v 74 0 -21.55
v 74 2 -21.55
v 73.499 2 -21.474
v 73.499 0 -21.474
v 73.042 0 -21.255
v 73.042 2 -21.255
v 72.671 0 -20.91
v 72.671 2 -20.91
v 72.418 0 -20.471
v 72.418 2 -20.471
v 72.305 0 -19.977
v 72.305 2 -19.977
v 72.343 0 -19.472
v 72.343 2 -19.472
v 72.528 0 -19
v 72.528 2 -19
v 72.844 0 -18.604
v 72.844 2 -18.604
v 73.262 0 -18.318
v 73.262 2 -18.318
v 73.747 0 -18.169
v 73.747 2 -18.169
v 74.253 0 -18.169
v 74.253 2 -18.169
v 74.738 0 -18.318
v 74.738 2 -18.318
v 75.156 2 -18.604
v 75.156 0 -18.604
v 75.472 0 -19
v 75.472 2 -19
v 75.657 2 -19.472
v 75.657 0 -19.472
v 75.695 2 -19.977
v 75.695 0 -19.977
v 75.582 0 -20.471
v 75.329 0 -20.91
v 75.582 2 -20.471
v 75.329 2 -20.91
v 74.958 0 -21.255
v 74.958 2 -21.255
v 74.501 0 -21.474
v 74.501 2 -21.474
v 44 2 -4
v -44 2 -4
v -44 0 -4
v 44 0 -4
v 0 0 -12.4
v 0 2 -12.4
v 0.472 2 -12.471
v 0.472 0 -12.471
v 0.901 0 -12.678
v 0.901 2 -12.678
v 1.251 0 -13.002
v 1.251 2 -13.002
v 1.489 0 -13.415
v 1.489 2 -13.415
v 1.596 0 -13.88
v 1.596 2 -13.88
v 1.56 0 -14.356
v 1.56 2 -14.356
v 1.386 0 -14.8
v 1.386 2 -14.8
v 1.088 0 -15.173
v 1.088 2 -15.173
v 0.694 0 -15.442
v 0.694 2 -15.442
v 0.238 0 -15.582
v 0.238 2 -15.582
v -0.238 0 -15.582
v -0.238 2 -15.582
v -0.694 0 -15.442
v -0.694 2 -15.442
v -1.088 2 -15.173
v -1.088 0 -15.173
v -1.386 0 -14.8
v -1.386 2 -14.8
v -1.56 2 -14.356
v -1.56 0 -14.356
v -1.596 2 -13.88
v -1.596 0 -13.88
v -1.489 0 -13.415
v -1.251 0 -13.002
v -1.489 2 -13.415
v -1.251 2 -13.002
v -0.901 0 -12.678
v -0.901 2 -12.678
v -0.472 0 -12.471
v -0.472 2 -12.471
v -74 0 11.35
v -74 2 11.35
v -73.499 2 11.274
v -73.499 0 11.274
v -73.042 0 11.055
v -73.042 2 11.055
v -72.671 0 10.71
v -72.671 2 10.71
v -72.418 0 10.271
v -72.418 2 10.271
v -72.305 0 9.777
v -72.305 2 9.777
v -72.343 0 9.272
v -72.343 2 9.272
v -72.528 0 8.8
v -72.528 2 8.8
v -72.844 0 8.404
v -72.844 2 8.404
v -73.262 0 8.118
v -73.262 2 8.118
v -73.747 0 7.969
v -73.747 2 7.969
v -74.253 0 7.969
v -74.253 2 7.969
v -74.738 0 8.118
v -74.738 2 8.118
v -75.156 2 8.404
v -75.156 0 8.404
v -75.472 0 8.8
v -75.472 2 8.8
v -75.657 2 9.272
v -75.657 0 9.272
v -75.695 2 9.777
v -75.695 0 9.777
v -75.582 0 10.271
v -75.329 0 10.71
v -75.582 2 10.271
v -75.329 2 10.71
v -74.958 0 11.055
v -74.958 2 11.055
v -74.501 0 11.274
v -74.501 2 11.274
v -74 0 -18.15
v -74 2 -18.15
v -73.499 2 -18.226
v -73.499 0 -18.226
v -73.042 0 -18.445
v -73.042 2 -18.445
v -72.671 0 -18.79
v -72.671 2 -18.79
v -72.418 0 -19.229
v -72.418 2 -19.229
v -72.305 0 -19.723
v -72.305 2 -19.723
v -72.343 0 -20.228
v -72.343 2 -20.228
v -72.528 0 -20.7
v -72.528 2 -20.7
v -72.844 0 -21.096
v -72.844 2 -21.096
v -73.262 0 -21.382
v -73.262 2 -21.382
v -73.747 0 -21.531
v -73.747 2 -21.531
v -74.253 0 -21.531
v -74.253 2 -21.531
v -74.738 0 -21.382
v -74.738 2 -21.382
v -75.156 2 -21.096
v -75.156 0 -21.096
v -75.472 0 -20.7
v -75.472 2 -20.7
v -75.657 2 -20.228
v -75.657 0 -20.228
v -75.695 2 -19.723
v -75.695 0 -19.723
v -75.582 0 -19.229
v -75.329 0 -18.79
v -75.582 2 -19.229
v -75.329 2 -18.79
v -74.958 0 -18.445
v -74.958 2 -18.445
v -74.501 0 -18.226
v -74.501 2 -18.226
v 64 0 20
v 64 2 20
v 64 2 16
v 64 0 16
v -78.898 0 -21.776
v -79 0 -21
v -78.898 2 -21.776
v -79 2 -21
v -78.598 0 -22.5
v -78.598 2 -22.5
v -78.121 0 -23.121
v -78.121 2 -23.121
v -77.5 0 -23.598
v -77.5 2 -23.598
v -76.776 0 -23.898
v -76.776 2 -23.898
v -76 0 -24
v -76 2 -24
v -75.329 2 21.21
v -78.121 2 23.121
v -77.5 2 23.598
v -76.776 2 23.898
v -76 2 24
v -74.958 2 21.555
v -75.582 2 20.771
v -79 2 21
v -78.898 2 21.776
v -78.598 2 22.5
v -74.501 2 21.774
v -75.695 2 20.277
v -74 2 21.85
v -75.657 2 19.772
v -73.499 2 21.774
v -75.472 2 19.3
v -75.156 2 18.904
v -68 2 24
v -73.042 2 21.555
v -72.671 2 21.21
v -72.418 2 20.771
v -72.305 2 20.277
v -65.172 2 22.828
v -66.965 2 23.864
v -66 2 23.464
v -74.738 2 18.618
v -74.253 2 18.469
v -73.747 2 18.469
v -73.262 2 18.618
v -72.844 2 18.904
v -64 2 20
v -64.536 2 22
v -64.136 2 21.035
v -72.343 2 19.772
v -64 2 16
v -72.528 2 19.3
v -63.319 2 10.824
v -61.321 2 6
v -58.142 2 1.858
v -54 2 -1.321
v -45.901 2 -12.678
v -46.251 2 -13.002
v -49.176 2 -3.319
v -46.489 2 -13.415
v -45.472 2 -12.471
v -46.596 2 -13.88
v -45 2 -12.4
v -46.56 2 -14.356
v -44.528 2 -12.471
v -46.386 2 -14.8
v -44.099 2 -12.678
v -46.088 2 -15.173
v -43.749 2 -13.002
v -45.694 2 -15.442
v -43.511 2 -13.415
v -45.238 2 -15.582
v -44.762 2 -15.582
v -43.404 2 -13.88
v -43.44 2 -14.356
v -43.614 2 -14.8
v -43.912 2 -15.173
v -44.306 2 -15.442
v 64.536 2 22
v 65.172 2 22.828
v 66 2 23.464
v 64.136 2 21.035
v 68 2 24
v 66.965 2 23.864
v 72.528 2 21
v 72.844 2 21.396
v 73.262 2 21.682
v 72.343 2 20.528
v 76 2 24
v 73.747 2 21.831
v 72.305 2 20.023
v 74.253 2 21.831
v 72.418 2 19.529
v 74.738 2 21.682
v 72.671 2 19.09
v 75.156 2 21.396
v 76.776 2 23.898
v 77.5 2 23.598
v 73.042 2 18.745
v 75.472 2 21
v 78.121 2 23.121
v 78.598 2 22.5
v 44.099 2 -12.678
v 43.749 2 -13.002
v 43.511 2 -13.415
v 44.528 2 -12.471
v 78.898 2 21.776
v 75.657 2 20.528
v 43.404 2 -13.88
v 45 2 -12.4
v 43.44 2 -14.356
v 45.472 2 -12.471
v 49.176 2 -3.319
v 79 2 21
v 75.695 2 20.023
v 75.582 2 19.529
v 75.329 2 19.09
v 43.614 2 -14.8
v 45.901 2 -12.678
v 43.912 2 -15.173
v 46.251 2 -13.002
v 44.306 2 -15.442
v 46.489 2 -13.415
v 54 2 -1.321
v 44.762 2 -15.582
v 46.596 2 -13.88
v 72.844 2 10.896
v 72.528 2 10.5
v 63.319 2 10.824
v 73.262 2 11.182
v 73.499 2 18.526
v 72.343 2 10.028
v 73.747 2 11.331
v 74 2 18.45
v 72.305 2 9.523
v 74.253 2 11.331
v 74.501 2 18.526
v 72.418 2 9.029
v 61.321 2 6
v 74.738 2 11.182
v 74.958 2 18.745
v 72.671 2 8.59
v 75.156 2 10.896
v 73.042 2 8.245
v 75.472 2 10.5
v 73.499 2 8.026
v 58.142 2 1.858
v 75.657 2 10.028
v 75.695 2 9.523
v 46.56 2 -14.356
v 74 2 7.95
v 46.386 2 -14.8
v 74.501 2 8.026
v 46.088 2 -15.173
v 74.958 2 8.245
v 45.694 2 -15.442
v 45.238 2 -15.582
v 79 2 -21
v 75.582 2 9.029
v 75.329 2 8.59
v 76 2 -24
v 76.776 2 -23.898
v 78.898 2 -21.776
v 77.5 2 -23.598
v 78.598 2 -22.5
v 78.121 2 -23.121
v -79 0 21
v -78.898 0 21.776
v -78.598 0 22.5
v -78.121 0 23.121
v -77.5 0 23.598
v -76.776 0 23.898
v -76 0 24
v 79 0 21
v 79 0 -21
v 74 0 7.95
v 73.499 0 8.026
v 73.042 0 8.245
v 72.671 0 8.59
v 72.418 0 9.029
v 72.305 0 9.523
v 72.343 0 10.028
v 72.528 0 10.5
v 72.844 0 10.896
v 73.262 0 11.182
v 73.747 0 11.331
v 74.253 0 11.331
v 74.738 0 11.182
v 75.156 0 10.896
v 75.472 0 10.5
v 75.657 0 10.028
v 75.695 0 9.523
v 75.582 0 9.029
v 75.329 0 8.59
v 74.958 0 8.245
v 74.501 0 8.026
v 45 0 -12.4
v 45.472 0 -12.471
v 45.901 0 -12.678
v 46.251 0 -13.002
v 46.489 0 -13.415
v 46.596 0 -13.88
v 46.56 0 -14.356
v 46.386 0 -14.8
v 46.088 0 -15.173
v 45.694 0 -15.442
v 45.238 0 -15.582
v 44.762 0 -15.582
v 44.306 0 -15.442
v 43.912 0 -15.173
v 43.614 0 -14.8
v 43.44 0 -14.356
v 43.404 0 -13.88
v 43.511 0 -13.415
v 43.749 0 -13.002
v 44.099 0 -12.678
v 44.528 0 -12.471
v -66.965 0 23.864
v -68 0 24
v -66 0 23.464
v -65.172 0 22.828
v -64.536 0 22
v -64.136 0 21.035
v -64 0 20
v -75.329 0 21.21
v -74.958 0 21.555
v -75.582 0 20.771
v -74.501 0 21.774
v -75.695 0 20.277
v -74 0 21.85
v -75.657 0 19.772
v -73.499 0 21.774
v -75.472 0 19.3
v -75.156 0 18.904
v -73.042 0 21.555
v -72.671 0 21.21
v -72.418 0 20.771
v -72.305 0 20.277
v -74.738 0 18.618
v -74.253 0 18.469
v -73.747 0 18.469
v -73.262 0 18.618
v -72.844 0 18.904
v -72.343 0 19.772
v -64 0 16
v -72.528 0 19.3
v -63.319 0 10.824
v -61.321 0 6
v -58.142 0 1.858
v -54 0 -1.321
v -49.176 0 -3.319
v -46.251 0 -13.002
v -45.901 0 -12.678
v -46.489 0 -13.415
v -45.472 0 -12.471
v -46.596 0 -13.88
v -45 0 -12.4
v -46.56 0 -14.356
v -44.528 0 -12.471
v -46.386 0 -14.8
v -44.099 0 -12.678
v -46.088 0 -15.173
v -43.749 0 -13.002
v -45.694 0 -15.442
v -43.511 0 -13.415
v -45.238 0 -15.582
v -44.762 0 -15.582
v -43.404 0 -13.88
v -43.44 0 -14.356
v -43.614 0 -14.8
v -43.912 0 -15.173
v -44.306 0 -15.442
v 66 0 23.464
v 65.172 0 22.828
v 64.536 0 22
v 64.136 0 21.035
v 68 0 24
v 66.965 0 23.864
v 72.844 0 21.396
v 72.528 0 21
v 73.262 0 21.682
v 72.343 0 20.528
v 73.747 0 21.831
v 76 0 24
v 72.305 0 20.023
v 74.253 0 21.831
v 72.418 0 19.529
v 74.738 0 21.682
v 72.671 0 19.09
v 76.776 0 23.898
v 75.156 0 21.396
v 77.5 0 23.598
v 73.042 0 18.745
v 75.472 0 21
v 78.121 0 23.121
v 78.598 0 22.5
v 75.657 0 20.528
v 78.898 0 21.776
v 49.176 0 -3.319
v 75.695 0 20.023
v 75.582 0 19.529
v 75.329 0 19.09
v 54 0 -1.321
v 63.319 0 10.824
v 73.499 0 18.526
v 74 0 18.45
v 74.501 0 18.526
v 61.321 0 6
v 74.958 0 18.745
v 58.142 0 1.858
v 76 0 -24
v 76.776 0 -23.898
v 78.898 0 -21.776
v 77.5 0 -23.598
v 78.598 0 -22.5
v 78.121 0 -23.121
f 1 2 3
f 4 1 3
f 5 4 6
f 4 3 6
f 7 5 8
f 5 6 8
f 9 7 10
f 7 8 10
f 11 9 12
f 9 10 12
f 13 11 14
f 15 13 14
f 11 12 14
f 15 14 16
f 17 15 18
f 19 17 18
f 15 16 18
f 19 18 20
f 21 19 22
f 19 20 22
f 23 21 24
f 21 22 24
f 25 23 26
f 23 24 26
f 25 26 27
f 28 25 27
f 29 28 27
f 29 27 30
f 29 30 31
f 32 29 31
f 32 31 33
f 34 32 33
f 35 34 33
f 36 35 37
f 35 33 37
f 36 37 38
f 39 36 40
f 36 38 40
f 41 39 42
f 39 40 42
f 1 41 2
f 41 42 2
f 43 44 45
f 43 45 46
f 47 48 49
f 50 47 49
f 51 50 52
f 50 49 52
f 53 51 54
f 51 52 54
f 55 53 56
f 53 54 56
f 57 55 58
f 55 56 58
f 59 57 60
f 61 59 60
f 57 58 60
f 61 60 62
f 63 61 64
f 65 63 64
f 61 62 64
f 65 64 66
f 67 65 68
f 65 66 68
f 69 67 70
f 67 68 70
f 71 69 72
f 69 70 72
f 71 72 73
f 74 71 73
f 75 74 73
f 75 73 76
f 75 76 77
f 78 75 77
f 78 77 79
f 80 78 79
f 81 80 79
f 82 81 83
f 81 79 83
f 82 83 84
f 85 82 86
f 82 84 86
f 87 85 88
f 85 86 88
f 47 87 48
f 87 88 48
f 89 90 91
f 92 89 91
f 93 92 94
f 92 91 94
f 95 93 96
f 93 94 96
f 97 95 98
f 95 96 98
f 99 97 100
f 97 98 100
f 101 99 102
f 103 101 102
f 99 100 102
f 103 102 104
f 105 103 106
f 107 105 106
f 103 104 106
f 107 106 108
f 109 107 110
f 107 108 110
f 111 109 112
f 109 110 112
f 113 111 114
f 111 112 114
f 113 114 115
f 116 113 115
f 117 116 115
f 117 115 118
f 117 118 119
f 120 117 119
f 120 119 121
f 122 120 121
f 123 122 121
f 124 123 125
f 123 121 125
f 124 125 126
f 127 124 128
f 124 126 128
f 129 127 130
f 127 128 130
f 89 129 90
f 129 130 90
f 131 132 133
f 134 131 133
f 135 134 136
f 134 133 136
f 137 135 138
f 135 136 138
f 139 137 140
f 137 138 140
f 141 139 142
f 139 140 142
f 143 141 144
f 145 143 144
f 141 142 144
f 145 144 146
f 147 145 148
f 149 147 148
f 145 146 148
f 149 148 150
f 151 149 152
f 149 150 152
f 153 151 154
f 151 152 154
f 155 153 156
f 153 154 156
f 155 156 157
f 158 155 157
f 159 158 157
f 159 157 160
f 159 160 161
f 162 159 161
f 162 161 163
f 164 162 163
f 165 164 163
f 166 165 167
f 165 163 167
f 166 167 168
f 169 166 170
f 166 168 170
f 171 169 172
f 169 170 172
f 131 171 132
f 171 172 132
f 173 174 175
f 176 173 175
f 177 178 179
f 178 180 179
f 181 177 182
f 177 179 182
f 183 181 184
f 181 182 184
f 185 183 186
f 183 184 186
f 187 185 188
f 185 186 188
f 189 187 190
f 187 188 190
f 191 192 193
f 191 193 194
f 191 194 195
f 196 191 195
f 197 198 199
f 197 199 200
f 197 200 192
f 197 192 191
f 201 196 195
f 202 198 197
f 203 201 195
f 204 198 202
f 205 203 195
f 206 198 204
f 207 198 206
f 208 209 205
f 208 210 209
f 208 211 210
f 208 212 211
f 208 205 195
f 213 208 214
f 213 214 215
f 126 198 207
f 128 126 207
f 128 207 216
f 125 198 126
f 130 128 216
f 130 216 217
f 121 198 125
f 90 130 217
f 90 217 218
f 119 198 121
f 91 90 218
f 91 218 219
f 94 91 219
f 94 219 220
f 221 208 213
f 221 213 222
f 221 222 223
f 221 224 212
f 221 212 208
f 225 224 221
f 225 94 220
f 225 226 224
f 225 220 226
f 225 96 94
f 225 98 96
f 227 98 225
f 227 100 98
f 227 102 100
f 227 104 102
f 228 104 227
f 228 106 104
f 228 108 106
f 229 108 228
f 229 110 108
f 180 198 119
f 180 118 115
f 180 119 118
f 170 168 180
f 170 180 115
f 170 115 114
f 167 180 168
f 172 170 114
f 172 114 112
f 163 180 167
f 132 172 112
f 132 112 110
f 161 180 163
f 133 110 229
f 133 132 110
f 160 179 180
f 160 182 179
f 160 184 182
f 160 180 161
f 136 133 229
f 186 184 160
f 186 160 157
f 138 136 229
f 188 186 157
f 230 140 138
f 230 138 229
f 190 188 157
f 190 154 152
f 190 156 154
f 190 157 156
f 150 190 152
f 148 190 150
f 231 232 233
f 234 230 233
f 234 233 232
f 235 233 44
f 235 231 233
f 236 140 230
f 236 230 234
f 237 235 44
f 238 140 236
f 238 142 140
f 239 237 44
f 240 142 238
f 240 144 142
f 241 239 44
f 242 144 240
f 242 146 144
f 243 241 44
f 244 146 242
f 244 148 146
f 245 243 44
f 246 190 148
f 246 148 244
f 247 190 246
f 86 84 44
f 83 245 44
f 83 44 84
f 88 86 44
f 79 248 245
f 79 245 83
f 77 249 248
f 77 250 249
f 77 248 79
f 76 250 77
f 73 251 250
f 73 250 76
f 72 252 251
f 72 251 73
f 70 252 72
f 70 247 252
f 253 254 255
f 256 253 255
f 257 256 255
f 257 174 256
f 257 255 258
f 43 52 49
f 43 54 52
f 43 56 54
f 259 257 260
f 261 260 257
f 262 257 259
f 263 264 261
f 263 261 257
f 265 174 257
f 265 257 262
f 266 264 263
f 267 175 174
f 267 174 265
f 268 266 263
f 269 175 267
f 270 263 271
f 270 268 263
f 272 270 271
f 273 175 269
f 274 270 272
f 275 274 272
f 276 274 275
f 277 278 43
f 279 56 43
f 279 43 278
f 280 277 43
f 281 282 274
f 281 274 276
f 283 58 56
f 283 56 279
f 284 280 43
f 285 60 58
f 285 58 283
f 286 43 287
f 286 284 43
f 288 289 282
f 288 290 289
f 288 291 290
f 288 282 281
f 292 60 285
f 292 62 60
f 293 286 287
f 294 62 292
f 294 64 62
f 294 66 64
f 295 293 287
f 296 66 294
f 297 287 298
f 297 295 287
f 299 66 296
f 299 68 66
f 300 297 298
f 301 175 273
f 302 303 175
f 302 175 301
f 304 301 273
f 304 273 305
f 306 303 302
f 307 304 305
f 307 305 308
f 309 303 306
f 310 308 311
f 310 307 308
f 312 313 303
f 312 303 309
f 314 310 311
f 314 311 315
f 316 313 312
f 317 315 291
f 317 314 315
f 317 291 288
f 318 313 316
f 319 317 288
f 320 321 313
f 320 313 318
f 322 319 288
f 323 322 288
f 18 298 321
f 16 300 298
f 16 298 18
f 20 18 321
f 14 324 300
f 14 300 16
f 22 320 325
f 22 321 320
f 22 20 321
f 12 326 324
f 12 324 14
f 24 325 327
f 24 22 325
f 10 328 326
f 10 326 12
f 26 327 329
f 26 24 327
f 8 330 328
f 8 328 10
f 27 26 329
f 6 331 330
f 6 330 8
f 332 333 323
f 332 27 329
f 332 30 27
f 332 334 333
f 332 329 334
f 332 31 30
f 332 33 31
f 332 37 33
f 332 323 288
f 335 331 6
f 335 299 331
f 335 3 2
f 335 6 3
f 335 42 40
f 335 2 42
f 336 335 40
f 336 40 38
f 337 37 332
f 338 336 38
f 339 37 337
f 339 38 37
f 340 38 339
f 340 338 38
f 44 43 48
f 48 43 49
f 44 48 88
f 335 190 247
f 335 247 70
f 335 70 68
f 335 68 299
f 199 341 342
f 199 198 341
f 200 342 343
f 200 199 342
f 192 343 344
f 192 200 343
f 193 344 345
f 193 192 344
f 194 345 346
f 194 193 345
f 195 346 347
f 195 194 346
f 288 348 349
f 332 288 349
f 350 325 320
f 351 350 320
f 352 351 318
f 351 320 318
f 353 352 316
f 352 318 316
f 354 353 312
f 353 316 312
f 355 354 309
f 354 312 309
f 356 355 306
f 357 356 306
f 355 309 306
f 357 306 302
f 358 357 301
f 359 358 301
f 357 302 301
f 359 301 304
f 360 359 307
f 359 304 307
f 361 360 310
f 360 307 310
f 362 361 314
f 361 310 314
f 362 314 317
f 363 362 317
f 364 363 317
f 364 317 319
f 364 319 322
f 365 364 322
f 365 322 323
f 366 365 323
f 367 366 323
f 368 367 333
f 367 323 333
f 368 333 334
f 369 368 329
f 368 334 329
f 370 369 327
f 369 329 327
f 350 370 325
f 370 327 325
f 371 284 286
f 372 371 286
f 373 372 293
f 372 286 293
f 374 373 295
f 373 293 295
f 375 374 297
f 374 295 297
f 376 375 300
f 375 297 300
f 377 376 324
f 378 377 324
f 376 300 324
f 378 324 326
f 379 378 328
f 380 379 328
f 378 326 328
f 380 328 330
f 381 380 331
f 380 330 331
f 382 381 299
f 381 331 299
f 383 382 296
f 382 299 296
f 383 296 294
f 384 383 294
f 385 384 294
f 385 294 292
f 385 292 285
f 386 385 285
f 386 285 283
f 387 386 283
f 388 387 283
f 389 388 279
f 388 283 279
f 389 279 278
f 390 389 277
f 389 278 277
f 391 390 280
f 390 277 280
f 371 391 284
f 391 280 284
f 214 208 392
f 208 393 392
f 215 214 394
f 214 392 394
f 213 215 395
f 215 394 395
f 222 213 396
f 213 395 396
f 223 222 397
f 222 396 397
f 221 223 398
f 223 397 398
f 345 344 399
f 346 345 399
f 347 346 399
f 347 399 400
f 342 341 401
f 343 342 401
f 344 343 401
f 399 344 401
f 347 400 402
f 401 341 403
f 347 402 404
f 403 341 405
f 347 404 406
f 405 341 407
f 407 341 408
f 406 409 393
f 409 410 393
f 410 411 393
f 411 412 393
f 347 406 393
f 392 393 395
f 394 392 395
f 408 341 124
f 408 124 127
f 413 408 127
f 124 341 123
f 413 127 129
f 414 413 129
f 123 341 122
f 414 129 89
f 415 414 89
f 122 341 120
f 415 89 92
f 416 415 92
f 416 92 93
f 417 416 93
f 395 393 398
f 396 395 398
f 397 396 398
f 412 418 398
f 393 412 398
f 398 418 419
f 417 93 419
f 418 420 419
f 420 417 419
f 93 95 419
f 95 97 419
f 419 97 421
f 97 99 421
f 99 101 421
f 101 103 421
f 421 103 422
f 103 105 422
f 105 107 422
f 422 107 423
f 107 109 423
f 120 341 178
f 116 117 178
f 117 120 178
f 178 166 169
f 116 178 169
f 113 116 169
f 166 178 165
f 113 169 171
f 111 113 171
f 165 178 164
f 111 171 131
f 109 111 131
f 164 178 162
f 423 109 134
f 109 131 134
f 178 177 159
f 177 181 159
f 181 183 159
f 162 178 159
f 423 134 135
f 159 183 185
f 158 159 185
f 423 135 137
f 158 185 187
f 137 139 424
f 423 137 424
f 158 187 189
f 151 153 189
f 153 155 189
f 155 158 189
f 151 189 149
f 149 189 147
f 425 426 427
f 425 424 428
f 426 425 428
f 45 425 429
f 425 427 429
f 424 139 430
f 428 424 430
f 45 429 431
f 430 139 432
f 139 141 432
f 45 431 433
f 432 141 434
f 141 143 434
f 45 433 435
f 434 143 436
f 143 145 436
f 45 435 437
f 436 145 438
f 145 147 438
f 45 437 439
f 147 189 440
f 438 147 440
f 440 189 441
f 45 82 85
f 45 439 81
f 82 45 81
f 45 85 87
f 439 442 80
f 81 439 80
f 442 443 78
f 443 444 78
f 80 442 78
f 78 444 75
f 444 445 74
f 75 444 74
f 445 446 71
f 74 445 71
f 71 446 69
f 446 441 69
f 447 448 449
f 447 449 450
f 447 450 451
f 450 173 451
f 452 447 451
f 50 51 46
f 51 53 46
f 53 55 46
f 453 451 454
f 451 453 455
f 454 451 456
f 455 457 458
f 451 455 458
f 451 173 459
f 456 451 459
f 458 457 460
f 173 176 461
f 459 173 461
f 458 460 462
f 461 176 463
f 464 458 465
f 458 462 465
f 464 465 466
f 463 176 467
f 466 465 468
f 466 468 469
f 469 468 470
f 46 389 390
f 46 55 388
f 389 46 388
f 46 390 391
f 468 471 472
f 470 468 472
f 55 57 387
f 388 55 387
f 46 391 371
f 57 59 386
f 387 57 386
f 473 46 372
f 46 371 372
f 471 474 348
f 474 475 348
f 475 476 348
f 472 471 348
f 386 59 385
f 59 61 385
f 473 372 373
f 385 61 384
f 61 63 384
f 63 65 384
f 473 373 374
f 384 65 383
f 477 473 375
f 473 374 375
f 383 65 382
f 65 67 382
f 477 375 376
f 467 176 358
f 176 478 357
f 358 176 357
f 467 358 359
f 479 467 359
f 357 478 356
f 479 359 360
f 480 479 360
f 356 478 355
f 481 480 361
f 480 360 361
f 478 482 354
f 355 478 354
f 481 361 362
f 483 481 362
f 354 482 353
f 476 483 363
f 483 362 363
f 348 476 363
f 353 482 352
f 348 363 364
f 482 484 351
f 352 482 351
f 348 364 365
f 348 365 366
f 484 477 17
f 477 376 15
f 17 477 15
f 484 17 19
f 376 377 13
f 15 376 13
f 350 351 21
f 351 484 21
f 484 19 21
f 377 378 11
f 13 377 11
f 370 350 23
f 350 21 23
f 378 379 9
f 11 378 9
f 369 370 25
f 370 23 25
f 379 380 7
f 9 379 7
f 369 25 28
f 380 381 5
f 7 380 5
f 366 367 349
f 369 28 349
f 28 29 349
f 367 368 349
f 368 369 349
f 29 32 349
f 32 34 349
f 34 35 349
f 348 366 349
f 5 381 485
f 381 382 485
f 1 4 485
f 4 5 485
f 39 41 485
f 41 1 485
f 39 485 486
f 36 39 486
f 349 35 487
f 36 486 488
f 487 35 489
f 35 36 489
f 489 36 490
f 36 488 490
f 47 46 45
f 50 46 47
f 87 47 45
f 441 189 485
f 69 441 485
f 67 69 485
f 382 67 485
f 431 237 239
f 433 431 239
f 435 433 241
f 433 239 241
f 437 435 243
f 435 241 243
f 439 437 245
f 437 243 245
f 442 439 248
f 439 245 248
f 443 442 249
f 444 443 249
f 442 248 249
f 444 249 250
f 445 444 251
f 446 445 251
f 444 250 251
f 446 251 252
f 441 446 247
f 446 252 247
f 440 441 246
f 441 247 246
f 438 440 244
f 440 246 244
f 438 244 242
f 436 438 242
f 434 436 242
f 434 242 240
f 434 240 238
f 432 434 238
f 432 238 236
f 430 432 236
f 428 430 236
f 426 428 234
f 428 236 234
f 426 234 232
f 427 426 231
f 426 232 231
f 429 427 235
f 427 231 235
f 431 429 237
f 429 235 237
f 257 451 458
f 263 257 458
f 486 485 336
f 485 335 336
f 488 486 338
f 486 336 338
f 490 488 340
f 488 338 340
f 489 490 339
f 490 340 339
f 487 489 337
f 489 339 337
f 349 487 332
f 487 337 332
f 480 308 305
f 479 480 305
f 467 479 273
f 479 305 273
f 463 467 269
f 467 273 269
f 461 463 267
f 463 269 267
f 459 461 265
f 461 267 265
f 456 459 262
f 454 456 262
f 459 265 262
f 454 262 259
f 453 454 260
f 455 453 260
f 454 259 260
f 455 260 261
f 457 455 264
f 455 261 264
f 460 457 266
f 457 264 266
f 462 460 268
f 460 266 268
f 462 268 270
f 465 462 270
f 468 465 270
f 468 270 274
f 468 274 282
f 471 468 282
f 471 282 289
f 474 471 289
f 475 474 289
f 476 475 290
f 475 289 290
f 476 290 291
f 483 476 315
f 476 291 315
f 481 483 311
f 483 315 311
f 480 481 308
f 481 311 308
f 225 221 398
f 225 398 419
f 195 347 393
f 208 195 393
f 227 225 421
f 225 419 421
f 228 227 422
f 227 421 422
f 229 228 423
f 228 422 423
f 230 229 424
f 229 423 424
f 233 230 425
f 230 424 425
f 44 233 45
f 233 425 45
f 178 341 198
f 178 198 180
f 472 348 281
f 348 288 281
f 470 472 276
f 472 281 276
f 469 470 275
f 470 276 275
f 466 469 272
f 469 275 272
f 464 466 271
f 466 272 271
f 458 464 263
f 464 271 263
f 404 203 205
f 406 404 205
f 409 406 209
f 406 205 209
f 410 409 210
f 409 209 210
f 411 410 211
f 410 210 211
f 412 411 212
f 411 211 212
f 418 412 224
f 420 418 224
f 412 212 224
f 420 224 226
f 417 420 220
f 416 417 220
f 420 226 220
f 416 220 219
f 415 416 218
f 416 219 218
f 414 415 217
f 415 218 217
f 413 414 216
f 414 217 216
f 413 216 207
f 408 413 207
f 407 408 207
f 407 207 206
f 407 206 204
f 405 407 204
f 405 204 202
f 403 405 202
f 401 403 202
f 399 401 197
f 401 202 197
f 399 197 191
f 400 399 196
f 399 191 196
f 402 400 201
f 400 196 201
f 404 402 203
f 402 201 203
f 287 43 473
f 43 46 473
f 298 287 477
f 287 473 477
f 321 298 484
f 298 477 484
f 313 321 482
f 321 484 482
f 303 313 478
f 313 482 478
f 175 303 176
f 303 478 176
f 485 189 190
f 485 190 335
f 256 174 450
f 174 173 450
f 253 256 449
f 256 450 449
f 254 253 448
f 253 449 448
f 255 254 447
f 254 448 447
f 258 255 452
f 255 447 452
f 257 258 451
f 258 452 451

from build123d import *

# Parameters (mm, degrees)
SKETCH_1_W          = 158
SKETCH_1_H          = 48
EXTRUDE_1_DEPTH     = 2
SKETCH_2_W          = 128
SKETCH_2_H          = 28
CUT_EXTRUDE_1_DEPTH = 2
SKETCH_4_R          = 1.7
CUT_EXTRUDE_2_DEPTH = 2
SKETCH_5_R          = 1.6
CUT_EXTRUDE_3_DEPTH = 2
FILLET_4_R          = 3
FILLET_5_R          = 4
FILLET_6_R          = 20


with BuildPart() as part:
    # 草图1 → 凸台-拉伸1 (new body)
    with BuildSketch(Plane(origin=(0, 0, 0), x_dir=(1, 0, 0), z_dir=(0, 1, 0))):
        Rectangle(SKETCH_1_W, SKETCH_1_H)
    extrude(amount=EXTRUDE_1_DEPTH)

    # 草图2 → 切除-拉伸1 (cut)
    with BuildSketch(Plane(origin=(0, 2, 0), x_dir=(1, 0, 0), z_dir=(0, 1, 0))):
        with Locations((0, -10)):
            Rectangle(SKETCH_2_W, SKETCH_2_H)
    extrude(amount=-CUT_EXTRUDE_1_DEPTH, mode=Mode.SUBTRACT)

    # 草图4 → 切除-拉伸2 (cut)
    with BuildSketch(Plane(origin=(0, 2, 0), x_dir=(1, 0, 0), z_dir=(0, 1, 0))):
        with Locations(Location((-74, 19.85, 0), (0, 0, 270))):
            Circle(SKETCH_4_R)
        with Locations(Location((-74, -9.65, 0), (0, 0, 270))):
            Circle(SKETCH_4_R)
        with Locations(Location((-74, -20.15, 0), (0, 0, 270))):
            Circle(SKETCH_4_R)
        with Locations(Location((74, -20.15, 0), (0, 0, 90))):
            Circle(SKETCH_4_R)
        with Locations(Location((74, -9.65, 0), (0, 0, 90))):
            Circle(SKETCH_4_R)
        with Locations(Location((74, 19.85, 0), (0, 0, 90))):
            Circle(SKETCH_4_R)
    extrude(amount=-CUT_EXTRUDE_2_DEPTH, mode=Mode.SUBTRACT)

    # 草图5 → 切除-拉伸3 (cut)
    with BuildSketch(Plane(origin=(0, 2, 0), x_dir=(1, 0, 0), z_dir=(0, 1, 0))):
        with Locations(Location((0, 14, 0), (0, 0, 270))):
            Circle(SKETCH_5_R)
        with Locations(Location((-45, 14, 0), (0, 0, 270))):
            Circle(SKETCH_5_R)
        with Locations(Location((45, 14, 0), (0, 0, 270))):
            Circle(SKETCH_5_R)
    extrude(amount=-CUT_EXTRUDE_3_DEPTH, mode=Mode.SUBTRACT)

    # 圆角4
    fillet_4_edges = [part.edges().sort_by_distance(p)[0] for p in [
        (79, 1, 24),
        (-79, 1, 24),
        (-79, 1, -24),
        (79, 1, -24),
    ]]
    fillet(fillet_4_edges, radius=FILLET_4_R)

    # 圆角5
    fillet_5_edges = [part.edges().sort_by_distance(p)[0] for p in [
        (64, 1, 24),
        (-64, 1, 24),
    ]]
    fillet(fillet_5_edges, radius=FILLET_5_R)

    # 圆角6
    fillet_6_edges = [part.edges().sort_by_distance(p)[0] for p in [
        (64, 1, -4),
        (-64, 1, -4),
    ]]
    fillet(fillet_6_edges, radius=FILLET_6_R)


solid = part.part
